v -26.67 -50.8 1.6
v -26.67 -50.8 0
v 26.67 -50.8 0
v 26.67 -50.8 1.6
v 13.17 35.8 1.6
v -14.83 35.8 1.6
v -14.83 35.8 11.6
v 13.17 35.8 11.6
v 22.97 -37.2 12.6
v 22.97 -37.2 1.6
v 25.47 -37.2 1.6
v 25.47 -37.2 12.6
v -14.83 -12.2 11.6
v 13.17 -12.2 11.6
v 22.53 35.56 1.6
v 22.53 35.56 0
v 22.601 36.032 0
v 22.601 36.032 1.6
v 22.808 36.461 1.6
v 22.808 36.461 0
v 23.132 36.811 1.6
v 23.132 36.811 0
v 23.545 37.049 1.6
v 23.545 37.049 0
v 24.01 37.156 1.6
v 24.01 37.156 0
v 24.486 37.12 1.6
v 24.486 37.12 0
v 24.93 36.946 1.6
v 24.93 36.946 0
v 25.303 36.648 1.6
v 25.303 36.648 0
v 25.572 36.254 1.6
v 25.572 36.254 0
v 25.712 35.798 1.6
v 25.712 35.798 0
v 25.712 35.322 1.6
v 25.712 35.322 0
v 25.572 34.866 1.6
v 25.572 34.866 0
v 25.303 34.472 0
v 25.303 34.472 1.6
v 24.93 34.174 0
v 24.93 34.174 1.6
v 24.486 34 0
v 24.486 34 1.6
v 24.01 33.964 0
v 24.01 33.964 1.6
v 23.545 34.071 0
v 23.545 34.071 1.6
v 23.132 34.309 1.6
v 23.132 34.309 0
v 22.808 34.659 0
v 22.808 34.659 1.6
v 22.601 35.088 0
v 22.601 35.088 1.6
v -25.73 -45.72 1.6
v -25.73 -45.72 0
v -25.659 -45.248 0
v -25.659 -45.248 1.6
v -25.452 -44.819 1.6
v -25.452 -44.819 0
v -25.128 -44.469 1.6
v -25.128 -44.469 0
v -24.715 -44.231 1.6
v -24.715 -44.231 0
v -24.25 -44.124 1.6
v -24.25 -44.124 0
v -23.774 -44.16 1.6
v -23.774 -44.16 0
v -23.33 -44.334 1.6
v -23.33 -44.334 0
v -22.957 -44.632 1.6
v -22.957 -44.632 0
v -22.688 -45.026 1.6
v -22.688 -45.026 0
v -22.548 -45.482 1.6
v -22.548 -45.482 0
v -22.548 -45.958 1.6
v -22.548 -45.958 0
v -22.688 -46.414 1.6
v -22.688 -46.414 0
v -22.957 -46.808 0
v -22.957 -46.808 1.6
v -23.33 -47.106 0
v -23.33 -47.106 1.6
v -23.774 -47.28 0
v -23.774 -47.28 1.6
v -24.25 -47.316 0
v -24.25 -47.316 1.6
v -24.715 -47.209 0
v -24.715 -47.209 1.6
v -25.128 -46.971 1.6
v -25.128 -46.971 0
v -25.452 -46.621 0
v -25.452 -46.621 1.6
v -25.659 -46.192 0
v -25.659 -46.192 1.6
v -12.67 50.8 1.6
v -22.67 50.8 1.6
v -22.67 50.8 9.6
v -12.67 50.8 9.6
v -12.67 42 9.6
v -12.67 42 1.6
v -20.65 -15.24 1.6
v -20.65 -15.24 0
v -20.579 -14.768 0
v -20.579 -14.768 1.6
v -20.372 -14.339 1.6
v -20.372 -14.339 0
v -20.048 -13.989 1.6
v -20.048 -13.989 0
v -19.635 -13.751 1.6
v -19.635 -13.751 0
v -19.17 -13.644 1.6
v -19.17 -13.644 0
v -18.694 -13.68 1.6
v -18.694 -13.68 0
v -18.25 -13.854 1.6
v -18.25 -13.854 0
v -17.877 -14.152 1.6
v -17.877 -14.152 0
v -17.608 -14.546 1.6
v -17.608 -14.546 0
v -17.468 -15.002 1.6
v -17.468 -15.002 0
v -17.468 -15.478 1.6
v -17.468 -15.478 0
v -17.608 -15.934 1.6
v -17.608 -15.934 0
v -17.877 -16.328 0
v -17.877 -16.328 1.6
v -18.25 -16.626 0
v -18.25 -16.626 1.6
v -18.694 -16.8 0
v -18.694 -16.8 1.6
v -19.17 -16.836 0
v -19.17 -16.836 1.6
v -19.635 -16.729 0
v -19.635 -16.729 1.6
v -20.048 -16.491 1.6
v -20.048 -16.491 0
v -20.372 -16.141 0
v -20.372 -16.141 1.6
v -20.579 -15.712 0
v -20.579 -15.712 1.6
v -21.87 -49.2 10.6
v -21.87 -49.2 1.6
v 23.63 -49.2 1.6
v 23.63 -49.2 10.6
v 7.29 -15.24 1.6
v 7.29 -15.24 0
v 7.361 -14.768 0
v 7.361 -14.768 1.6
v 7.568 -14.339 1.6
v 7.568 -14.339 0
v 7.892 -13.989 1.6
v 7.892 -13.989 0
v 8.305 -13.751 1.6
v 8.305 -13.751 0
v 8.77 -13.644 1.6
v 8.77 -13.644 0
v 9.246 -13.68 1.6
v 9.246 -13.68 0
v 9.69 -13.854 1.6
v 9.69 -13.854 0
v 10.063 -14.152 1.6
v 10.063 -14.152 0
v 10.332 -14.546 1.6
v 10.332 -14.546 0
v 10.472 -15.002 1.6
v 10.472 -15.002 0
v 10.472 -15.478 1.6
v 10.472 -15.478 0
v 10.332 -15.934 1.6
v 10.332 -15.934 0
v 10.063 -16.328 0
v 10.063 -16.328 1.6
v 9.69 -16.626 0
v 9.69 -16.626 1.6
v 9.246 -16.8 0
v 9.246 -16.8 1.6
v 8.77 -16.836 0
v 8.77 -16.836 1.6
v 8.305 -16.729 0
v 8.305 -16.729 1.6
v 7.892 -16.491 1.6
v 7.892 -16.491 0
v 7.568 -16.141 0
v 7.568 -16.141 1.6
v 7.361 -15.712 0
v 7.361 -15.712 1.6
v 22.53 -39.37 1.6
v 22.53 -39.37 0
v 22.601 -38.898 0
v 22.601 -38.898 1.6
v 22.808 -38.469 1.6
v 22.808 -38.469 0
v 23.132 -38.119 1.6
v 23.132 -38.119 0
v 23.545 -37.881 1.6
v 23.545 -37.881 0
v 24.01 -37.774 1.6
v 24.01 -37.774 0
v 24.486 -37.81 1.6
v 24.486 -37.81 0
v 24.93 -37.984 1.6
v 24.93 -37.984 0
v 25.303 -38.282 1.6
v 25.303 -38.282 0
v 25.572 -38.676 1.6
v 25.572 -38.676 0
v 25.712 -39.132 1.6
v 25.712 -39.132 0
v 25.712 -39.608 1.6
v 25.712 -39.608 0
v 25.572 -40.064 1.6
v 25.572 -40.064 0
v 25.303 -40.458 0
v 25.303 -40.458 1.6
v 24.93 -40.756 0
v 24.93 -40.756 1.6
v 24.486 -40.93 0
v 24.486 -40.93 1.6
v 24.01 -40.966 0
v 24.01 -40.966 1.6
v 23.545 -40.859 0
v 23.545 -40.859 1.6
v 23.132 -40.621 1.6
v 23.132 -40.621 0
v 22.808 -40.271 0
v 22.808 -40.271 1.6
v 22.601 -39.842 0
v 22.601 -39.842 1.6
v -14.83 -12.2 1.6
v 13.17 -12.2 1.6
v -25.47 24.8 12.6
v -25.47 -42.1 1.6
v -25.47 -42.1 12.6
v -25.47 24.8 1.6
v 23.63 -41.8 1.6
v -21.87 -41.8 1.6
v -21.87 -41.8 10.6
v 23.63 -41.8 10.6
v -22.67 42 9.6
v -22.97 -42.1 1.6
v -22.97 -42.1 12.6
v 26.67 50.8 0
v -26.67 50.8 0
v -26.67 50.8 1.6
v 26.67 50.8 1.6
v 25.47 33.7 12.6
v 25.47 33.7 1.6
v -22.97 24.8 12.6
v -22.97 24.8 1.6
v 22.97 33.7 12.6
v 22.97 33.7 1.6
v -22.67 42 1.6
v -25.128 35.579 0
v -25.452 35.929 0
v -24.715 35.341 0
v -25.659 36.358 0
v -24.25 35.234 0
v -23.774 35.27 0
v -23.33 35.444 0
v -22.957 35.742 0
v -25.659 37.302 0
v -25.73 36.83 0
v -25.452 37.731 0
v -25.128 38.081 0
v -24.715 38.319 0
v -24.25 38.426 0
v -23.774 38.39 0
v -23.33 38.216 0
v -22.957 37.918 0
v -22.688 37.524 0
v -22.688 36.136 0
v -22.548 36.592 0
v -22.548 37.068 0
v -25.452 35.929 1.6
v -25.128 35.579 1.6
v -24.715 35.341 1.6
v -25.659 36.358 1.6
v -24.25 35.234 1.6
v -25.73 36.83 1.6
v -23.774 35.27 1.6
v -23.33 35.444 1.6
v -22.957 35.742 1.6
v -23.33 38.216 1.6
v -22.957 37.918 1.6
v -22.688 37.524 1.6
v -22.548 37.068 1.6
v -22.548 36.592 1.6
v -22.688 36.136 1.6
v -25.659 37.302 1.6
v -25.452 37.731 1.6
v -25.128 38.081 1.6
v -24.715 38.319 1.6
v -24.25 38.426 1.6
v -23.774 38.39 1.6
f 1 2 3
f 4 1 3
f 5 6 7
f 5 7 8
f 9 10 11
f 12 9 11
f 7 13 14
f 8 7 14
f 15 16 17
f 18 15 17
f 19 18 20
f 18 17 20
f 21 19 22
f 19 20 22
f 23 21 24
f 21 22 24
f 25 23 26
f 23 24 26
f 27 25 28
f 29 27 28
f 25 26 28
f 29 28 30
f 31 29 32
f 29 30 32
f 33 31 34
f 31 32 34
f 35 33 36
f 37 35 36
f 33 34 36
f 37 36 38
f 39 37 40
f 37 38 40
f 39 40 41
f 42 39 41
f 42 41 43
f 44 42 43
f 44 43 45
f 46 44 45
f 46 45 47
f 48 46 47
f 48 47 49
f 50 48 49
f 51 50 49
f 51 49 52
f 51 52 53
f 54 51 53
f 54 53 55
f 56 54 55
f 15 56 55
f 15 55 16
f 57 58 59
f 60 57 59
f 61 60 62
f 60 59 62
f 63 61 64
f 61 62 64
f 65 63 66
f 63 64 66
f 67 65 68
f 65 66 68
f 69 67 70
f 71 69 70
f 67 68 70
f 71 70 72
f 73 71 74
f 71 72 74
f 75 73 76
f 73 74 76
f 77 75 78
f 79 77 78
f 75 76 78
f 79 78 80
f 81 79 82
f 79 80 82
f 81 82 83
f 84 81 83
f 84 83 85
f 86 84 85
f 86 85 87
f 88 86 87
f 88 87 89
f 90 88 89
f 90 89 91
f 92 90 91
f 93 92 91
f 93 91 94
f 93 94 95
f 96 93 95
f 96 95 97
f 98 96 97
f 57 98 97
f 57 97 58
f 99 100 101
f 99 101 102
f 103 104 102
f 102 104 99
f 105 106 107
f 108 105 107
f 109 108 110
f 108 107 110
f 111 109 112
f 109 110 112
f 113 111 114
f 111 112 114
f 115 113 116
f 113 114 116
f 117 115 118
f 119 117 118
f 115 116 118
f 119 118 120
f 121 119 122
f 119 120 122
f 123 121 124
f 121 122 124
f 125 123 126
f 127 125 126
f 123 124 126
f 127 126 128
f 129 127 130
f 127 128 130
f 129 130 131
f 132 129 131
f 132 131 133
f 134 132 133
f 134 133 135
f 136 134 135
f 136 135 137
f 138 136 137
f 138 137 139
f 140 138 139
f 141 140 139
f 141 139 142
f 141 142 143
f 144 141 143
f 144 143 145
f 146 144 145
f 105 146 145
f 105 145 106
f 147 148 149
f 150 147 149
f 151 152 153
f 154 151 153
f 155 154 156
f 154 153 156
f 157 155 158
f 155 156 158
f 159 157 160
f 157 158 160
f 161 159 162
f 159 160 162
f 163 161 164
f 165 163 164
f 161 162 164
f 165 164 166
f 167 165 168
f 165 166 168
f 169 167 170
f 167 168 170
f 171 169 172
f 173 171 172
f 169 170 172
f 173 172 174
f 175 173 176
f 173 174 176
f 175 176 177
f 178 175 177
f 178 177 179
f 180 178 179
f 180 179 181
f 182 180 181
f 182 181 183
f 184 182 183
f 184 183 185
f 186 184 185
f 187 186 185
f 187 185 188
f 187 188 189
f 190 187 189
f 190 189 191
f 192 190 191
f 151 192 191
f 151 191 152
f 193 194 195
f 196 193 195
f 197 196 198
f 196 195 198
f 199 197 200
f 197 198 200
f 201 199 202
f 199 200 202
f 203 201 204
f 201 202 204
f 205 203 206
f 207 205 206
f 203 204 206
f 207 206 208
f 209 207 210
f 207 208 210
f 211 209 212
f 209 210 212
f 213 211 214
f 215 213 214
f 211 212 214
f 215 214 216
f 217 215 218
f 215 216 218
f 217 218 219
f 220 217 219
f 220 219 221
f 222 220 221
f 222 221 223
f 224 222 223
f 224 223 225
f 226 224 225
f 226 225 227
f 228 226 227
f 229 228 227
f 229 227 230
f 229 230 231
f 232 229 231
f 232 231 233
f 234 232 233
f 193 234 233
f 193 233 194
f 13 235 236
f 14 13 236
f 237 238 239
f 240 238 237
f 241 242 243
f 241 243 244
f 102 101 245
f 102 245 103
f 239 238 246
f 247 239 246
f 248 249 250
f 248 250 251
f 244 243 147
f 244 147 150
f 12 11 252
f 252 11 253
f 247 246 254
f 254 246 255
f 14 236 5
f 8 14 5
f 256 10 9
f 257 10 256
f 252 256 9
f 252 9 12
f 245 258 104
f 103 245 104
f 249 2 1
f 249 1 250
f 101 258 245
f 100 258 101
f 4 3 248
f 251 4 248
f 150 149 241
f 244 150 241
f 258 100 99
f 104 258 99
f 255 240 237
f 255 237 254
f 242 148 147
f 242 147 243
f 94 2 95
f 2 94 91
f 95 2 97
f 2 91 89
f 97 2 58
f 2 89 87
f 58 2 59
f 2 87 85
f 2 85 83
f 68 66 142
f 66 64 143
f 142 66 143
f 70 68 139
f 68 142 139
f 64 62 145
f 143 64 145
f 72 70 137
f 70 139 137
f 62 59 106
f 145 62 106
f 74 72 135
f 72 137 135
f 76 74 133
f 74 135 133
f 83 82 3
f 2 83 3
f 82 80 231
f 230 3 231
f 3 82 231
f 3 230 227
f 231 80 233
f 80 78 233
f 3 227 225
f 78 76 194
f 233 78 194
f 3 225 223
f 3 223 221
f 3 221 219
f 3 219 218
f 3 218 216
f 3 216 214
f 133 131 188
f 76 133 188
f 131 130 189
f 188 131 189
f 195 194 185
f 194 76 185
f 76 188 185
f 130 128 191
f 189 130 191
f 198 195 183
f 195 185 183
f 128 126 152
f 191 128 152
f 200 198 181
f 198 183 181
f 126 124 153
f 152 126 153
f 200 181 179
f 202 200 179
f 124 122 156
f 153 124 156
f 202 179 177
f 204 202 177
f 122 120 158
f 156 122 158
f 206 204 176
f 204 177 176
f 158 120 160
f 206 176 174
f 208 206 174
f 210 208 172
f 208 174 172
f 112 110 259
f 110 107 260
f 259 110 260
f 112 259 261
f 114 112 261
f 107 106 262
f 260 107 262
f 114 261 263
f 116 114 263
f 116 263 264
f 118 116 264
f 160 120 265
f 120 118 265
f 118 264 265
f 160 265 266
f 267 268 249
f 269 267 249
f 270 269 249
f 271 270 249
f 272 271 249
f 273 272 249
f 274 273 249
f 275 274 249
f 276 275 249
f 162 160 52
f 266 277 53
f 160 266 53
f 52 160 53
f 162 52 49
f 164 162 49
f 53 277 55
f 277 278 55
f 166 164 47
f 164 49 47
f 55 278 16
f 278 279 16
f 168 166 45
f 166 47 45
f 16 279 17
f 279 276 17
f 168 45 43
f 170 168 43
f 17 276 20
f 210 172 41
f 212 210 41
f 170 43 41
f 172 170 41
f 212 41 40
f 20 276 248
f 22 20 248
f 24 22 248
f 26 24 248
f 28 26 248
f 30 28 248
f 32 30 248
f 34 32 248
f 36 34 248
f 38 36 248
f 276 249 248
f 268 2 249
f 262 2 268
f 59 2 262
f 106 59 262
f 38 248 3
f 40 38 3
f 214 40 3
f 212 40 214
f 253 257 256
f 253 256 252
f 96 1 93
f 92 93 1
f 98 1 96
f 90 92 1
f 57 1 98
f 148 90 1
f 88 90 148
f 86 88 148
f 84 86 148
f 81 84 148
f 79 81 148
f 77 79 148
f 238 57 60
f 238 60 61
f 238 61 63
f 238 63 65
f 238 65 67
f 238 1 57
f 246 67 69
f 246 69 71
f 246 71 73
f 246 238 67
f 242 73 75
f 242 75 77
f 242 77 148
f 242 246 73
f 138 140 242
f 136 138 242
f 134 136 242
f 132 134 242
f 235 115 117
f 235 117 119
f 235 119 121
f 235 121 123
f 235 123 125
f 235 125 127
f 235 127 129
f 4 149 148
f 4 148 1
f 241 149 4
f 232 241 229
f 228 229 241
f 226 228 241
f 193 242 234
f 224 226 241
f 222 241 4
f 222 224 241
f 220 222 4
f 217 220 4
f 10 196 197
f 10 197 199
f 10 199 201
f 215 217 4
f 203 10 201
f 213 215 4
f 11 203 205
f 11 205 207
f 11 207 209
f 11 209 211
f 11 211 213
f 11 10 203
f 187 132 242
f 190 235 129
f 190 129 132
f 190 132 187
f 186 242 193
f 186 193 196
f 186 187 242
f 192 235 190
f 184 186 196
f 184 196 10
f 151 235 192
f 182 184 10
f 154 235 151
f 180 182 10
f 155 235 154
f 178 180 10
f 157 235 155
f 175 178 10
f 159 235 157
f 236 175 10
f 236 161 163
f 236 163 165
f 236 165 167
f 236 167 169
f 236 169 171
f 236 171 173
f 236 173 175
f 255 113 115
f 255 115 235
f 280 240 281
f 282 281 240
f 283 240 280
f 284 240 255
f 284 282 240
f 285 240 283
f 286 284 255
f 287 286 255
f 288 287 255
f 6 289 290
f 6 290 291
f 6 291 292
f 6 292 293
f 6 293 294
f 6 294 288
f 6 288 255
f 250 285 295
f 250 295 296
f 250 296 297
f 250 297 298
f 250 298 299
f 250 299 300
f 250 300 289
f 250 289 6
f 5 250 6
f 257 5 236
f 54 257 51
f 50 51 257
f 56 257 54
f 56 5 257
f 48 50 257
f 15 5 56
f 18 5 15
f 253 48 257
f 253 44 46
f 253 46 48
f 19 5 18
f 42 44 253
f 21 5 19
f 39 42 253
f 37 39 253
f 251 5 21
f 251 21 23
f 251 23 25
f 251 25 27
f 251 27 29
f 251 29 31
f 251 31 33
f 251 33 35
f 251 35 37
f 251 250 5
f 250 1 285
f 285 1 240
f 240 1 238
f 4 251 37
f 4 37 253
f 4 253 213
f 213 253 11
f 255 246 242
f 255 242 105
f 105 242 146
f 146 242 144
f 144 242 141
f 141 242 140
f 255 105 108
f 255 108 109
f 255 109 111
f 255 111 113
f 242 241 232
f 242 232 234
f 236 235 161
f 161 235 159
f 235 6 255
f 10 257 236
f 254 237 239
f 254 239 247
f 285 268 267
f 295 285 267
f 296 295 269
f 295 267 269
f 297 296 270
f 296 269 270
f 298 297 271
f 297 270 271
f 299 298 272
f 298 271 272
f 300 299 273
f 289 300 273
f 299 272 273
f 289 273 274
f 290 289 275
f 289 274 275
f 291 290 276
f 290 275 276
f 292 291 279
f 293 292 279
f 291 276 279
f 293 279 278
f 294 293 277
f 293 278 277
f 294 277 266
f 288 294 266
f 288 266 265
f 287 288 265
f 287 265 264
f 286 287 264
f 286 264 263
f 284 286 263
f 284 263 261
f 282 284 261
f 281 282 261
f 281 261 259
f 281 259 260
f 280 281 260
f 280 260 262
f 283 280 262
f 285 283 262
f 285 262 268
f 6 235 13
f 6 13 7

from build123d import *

# Parameters (mm, degrees)
SKETCH_1_W                  = 53.34
SKETCH_1_H                  = 101.6
EXTRUDE_1_DEPTH             = 1.6
SKETCH_2_W                  = 2.5
SKETCH_2_H                  = 66.9
SKETCH_2_H_2                = 70.9
EXTRUDE_2_DEPTH             = 11
SKETCH_3_W                  = 45.5
SKETCH_3_H                  = 7.4
EXTRUDE_3_DEPTH             = 9
HOLE_WIZARD_3_2_3_2_1_D     = 3.2
HOLE_WIZARD_3_2_3_2_1_DEPTH = 1.6
SKETCH_7_W                  = 28
SKETCH_7_H                  = 48
EXTRUDE_4_DEPTH             = 10
SKETCH_8_W                  = 10
SKETCH_8_H                  = 8.8
EXTRUDE_5_DEPTH             = 8


with BuildPart() as part:
    # 草圖1 → 填料-伸長1 (new body)
    with BuildSketch(Plane.XY):
        Rectangle(SKETCH_1_W, SKETCH_1_H)
    extrude(amount=EXTRUDE_1_DEPTH)

    # 草圖2 → 填料-伸長2 (add)
    with BuildSketch(Plane.XY.offset(1.6)):
        with Locations((-24.22, -8.65)):
            Rectangle(SKETCH_2_W, SKETCH_2_H)
        with Locations((24.22, -1.75)):
            Rectangle(SKETCH_2_W, SKETCH_2_H_2)
    extrude(amount=EXTRUDE_2_DEPTH)

    # 草圖3 → 填料-伸長3 (add)
    with BuildSketch(Plane.XY.offset(1.6)):
        with Locations((0.88, -45.5)):
            Rectangle(SKETCH_3_W, SKETCH_3_H)
    extrude(amount=EXTRUDE_3_DEPTH)

    # Ø3.2 (3.2) 直徑孔1
    with Locations(Plane.XY.offset(1.6)):
        with Locations((24.13, -39.37), (-24.13, -45.72), (-19.05, -15.24), (8.89, -15.24), (-24.13, 36.83), (24.13, 35.56)):
            Hole(HOLE_WIZARD_3_2_3_2_1_D / 2, depth=HOLE_WIZARD_3_2_3_2_1_DEPTH)

    # 草圖7 → 填料-伸長4 (add)
    with BuildSketch(Plane.XY.offset(1.6)):
        with Locations((-0.83, 11.8)):
            Rectangle(SKETCH_7_W, SKETCH_7_H)
    extrude(amount=EXTRUDE_4_DEPTH)


with BuildPart() as body_2:
    # 草圖8 → 填料-伸長5 (new body)
    with BuildSketch(Plane.XY.offset(1.6)):
        with Locations((-17.67, 46.4)):
            Rectangle(SKETCH_8_W, SKETCH_8_H)
    extrude(amount=EXTRUDE_5_DEPTH)


solid = Compound([part.part, body_2.part])
